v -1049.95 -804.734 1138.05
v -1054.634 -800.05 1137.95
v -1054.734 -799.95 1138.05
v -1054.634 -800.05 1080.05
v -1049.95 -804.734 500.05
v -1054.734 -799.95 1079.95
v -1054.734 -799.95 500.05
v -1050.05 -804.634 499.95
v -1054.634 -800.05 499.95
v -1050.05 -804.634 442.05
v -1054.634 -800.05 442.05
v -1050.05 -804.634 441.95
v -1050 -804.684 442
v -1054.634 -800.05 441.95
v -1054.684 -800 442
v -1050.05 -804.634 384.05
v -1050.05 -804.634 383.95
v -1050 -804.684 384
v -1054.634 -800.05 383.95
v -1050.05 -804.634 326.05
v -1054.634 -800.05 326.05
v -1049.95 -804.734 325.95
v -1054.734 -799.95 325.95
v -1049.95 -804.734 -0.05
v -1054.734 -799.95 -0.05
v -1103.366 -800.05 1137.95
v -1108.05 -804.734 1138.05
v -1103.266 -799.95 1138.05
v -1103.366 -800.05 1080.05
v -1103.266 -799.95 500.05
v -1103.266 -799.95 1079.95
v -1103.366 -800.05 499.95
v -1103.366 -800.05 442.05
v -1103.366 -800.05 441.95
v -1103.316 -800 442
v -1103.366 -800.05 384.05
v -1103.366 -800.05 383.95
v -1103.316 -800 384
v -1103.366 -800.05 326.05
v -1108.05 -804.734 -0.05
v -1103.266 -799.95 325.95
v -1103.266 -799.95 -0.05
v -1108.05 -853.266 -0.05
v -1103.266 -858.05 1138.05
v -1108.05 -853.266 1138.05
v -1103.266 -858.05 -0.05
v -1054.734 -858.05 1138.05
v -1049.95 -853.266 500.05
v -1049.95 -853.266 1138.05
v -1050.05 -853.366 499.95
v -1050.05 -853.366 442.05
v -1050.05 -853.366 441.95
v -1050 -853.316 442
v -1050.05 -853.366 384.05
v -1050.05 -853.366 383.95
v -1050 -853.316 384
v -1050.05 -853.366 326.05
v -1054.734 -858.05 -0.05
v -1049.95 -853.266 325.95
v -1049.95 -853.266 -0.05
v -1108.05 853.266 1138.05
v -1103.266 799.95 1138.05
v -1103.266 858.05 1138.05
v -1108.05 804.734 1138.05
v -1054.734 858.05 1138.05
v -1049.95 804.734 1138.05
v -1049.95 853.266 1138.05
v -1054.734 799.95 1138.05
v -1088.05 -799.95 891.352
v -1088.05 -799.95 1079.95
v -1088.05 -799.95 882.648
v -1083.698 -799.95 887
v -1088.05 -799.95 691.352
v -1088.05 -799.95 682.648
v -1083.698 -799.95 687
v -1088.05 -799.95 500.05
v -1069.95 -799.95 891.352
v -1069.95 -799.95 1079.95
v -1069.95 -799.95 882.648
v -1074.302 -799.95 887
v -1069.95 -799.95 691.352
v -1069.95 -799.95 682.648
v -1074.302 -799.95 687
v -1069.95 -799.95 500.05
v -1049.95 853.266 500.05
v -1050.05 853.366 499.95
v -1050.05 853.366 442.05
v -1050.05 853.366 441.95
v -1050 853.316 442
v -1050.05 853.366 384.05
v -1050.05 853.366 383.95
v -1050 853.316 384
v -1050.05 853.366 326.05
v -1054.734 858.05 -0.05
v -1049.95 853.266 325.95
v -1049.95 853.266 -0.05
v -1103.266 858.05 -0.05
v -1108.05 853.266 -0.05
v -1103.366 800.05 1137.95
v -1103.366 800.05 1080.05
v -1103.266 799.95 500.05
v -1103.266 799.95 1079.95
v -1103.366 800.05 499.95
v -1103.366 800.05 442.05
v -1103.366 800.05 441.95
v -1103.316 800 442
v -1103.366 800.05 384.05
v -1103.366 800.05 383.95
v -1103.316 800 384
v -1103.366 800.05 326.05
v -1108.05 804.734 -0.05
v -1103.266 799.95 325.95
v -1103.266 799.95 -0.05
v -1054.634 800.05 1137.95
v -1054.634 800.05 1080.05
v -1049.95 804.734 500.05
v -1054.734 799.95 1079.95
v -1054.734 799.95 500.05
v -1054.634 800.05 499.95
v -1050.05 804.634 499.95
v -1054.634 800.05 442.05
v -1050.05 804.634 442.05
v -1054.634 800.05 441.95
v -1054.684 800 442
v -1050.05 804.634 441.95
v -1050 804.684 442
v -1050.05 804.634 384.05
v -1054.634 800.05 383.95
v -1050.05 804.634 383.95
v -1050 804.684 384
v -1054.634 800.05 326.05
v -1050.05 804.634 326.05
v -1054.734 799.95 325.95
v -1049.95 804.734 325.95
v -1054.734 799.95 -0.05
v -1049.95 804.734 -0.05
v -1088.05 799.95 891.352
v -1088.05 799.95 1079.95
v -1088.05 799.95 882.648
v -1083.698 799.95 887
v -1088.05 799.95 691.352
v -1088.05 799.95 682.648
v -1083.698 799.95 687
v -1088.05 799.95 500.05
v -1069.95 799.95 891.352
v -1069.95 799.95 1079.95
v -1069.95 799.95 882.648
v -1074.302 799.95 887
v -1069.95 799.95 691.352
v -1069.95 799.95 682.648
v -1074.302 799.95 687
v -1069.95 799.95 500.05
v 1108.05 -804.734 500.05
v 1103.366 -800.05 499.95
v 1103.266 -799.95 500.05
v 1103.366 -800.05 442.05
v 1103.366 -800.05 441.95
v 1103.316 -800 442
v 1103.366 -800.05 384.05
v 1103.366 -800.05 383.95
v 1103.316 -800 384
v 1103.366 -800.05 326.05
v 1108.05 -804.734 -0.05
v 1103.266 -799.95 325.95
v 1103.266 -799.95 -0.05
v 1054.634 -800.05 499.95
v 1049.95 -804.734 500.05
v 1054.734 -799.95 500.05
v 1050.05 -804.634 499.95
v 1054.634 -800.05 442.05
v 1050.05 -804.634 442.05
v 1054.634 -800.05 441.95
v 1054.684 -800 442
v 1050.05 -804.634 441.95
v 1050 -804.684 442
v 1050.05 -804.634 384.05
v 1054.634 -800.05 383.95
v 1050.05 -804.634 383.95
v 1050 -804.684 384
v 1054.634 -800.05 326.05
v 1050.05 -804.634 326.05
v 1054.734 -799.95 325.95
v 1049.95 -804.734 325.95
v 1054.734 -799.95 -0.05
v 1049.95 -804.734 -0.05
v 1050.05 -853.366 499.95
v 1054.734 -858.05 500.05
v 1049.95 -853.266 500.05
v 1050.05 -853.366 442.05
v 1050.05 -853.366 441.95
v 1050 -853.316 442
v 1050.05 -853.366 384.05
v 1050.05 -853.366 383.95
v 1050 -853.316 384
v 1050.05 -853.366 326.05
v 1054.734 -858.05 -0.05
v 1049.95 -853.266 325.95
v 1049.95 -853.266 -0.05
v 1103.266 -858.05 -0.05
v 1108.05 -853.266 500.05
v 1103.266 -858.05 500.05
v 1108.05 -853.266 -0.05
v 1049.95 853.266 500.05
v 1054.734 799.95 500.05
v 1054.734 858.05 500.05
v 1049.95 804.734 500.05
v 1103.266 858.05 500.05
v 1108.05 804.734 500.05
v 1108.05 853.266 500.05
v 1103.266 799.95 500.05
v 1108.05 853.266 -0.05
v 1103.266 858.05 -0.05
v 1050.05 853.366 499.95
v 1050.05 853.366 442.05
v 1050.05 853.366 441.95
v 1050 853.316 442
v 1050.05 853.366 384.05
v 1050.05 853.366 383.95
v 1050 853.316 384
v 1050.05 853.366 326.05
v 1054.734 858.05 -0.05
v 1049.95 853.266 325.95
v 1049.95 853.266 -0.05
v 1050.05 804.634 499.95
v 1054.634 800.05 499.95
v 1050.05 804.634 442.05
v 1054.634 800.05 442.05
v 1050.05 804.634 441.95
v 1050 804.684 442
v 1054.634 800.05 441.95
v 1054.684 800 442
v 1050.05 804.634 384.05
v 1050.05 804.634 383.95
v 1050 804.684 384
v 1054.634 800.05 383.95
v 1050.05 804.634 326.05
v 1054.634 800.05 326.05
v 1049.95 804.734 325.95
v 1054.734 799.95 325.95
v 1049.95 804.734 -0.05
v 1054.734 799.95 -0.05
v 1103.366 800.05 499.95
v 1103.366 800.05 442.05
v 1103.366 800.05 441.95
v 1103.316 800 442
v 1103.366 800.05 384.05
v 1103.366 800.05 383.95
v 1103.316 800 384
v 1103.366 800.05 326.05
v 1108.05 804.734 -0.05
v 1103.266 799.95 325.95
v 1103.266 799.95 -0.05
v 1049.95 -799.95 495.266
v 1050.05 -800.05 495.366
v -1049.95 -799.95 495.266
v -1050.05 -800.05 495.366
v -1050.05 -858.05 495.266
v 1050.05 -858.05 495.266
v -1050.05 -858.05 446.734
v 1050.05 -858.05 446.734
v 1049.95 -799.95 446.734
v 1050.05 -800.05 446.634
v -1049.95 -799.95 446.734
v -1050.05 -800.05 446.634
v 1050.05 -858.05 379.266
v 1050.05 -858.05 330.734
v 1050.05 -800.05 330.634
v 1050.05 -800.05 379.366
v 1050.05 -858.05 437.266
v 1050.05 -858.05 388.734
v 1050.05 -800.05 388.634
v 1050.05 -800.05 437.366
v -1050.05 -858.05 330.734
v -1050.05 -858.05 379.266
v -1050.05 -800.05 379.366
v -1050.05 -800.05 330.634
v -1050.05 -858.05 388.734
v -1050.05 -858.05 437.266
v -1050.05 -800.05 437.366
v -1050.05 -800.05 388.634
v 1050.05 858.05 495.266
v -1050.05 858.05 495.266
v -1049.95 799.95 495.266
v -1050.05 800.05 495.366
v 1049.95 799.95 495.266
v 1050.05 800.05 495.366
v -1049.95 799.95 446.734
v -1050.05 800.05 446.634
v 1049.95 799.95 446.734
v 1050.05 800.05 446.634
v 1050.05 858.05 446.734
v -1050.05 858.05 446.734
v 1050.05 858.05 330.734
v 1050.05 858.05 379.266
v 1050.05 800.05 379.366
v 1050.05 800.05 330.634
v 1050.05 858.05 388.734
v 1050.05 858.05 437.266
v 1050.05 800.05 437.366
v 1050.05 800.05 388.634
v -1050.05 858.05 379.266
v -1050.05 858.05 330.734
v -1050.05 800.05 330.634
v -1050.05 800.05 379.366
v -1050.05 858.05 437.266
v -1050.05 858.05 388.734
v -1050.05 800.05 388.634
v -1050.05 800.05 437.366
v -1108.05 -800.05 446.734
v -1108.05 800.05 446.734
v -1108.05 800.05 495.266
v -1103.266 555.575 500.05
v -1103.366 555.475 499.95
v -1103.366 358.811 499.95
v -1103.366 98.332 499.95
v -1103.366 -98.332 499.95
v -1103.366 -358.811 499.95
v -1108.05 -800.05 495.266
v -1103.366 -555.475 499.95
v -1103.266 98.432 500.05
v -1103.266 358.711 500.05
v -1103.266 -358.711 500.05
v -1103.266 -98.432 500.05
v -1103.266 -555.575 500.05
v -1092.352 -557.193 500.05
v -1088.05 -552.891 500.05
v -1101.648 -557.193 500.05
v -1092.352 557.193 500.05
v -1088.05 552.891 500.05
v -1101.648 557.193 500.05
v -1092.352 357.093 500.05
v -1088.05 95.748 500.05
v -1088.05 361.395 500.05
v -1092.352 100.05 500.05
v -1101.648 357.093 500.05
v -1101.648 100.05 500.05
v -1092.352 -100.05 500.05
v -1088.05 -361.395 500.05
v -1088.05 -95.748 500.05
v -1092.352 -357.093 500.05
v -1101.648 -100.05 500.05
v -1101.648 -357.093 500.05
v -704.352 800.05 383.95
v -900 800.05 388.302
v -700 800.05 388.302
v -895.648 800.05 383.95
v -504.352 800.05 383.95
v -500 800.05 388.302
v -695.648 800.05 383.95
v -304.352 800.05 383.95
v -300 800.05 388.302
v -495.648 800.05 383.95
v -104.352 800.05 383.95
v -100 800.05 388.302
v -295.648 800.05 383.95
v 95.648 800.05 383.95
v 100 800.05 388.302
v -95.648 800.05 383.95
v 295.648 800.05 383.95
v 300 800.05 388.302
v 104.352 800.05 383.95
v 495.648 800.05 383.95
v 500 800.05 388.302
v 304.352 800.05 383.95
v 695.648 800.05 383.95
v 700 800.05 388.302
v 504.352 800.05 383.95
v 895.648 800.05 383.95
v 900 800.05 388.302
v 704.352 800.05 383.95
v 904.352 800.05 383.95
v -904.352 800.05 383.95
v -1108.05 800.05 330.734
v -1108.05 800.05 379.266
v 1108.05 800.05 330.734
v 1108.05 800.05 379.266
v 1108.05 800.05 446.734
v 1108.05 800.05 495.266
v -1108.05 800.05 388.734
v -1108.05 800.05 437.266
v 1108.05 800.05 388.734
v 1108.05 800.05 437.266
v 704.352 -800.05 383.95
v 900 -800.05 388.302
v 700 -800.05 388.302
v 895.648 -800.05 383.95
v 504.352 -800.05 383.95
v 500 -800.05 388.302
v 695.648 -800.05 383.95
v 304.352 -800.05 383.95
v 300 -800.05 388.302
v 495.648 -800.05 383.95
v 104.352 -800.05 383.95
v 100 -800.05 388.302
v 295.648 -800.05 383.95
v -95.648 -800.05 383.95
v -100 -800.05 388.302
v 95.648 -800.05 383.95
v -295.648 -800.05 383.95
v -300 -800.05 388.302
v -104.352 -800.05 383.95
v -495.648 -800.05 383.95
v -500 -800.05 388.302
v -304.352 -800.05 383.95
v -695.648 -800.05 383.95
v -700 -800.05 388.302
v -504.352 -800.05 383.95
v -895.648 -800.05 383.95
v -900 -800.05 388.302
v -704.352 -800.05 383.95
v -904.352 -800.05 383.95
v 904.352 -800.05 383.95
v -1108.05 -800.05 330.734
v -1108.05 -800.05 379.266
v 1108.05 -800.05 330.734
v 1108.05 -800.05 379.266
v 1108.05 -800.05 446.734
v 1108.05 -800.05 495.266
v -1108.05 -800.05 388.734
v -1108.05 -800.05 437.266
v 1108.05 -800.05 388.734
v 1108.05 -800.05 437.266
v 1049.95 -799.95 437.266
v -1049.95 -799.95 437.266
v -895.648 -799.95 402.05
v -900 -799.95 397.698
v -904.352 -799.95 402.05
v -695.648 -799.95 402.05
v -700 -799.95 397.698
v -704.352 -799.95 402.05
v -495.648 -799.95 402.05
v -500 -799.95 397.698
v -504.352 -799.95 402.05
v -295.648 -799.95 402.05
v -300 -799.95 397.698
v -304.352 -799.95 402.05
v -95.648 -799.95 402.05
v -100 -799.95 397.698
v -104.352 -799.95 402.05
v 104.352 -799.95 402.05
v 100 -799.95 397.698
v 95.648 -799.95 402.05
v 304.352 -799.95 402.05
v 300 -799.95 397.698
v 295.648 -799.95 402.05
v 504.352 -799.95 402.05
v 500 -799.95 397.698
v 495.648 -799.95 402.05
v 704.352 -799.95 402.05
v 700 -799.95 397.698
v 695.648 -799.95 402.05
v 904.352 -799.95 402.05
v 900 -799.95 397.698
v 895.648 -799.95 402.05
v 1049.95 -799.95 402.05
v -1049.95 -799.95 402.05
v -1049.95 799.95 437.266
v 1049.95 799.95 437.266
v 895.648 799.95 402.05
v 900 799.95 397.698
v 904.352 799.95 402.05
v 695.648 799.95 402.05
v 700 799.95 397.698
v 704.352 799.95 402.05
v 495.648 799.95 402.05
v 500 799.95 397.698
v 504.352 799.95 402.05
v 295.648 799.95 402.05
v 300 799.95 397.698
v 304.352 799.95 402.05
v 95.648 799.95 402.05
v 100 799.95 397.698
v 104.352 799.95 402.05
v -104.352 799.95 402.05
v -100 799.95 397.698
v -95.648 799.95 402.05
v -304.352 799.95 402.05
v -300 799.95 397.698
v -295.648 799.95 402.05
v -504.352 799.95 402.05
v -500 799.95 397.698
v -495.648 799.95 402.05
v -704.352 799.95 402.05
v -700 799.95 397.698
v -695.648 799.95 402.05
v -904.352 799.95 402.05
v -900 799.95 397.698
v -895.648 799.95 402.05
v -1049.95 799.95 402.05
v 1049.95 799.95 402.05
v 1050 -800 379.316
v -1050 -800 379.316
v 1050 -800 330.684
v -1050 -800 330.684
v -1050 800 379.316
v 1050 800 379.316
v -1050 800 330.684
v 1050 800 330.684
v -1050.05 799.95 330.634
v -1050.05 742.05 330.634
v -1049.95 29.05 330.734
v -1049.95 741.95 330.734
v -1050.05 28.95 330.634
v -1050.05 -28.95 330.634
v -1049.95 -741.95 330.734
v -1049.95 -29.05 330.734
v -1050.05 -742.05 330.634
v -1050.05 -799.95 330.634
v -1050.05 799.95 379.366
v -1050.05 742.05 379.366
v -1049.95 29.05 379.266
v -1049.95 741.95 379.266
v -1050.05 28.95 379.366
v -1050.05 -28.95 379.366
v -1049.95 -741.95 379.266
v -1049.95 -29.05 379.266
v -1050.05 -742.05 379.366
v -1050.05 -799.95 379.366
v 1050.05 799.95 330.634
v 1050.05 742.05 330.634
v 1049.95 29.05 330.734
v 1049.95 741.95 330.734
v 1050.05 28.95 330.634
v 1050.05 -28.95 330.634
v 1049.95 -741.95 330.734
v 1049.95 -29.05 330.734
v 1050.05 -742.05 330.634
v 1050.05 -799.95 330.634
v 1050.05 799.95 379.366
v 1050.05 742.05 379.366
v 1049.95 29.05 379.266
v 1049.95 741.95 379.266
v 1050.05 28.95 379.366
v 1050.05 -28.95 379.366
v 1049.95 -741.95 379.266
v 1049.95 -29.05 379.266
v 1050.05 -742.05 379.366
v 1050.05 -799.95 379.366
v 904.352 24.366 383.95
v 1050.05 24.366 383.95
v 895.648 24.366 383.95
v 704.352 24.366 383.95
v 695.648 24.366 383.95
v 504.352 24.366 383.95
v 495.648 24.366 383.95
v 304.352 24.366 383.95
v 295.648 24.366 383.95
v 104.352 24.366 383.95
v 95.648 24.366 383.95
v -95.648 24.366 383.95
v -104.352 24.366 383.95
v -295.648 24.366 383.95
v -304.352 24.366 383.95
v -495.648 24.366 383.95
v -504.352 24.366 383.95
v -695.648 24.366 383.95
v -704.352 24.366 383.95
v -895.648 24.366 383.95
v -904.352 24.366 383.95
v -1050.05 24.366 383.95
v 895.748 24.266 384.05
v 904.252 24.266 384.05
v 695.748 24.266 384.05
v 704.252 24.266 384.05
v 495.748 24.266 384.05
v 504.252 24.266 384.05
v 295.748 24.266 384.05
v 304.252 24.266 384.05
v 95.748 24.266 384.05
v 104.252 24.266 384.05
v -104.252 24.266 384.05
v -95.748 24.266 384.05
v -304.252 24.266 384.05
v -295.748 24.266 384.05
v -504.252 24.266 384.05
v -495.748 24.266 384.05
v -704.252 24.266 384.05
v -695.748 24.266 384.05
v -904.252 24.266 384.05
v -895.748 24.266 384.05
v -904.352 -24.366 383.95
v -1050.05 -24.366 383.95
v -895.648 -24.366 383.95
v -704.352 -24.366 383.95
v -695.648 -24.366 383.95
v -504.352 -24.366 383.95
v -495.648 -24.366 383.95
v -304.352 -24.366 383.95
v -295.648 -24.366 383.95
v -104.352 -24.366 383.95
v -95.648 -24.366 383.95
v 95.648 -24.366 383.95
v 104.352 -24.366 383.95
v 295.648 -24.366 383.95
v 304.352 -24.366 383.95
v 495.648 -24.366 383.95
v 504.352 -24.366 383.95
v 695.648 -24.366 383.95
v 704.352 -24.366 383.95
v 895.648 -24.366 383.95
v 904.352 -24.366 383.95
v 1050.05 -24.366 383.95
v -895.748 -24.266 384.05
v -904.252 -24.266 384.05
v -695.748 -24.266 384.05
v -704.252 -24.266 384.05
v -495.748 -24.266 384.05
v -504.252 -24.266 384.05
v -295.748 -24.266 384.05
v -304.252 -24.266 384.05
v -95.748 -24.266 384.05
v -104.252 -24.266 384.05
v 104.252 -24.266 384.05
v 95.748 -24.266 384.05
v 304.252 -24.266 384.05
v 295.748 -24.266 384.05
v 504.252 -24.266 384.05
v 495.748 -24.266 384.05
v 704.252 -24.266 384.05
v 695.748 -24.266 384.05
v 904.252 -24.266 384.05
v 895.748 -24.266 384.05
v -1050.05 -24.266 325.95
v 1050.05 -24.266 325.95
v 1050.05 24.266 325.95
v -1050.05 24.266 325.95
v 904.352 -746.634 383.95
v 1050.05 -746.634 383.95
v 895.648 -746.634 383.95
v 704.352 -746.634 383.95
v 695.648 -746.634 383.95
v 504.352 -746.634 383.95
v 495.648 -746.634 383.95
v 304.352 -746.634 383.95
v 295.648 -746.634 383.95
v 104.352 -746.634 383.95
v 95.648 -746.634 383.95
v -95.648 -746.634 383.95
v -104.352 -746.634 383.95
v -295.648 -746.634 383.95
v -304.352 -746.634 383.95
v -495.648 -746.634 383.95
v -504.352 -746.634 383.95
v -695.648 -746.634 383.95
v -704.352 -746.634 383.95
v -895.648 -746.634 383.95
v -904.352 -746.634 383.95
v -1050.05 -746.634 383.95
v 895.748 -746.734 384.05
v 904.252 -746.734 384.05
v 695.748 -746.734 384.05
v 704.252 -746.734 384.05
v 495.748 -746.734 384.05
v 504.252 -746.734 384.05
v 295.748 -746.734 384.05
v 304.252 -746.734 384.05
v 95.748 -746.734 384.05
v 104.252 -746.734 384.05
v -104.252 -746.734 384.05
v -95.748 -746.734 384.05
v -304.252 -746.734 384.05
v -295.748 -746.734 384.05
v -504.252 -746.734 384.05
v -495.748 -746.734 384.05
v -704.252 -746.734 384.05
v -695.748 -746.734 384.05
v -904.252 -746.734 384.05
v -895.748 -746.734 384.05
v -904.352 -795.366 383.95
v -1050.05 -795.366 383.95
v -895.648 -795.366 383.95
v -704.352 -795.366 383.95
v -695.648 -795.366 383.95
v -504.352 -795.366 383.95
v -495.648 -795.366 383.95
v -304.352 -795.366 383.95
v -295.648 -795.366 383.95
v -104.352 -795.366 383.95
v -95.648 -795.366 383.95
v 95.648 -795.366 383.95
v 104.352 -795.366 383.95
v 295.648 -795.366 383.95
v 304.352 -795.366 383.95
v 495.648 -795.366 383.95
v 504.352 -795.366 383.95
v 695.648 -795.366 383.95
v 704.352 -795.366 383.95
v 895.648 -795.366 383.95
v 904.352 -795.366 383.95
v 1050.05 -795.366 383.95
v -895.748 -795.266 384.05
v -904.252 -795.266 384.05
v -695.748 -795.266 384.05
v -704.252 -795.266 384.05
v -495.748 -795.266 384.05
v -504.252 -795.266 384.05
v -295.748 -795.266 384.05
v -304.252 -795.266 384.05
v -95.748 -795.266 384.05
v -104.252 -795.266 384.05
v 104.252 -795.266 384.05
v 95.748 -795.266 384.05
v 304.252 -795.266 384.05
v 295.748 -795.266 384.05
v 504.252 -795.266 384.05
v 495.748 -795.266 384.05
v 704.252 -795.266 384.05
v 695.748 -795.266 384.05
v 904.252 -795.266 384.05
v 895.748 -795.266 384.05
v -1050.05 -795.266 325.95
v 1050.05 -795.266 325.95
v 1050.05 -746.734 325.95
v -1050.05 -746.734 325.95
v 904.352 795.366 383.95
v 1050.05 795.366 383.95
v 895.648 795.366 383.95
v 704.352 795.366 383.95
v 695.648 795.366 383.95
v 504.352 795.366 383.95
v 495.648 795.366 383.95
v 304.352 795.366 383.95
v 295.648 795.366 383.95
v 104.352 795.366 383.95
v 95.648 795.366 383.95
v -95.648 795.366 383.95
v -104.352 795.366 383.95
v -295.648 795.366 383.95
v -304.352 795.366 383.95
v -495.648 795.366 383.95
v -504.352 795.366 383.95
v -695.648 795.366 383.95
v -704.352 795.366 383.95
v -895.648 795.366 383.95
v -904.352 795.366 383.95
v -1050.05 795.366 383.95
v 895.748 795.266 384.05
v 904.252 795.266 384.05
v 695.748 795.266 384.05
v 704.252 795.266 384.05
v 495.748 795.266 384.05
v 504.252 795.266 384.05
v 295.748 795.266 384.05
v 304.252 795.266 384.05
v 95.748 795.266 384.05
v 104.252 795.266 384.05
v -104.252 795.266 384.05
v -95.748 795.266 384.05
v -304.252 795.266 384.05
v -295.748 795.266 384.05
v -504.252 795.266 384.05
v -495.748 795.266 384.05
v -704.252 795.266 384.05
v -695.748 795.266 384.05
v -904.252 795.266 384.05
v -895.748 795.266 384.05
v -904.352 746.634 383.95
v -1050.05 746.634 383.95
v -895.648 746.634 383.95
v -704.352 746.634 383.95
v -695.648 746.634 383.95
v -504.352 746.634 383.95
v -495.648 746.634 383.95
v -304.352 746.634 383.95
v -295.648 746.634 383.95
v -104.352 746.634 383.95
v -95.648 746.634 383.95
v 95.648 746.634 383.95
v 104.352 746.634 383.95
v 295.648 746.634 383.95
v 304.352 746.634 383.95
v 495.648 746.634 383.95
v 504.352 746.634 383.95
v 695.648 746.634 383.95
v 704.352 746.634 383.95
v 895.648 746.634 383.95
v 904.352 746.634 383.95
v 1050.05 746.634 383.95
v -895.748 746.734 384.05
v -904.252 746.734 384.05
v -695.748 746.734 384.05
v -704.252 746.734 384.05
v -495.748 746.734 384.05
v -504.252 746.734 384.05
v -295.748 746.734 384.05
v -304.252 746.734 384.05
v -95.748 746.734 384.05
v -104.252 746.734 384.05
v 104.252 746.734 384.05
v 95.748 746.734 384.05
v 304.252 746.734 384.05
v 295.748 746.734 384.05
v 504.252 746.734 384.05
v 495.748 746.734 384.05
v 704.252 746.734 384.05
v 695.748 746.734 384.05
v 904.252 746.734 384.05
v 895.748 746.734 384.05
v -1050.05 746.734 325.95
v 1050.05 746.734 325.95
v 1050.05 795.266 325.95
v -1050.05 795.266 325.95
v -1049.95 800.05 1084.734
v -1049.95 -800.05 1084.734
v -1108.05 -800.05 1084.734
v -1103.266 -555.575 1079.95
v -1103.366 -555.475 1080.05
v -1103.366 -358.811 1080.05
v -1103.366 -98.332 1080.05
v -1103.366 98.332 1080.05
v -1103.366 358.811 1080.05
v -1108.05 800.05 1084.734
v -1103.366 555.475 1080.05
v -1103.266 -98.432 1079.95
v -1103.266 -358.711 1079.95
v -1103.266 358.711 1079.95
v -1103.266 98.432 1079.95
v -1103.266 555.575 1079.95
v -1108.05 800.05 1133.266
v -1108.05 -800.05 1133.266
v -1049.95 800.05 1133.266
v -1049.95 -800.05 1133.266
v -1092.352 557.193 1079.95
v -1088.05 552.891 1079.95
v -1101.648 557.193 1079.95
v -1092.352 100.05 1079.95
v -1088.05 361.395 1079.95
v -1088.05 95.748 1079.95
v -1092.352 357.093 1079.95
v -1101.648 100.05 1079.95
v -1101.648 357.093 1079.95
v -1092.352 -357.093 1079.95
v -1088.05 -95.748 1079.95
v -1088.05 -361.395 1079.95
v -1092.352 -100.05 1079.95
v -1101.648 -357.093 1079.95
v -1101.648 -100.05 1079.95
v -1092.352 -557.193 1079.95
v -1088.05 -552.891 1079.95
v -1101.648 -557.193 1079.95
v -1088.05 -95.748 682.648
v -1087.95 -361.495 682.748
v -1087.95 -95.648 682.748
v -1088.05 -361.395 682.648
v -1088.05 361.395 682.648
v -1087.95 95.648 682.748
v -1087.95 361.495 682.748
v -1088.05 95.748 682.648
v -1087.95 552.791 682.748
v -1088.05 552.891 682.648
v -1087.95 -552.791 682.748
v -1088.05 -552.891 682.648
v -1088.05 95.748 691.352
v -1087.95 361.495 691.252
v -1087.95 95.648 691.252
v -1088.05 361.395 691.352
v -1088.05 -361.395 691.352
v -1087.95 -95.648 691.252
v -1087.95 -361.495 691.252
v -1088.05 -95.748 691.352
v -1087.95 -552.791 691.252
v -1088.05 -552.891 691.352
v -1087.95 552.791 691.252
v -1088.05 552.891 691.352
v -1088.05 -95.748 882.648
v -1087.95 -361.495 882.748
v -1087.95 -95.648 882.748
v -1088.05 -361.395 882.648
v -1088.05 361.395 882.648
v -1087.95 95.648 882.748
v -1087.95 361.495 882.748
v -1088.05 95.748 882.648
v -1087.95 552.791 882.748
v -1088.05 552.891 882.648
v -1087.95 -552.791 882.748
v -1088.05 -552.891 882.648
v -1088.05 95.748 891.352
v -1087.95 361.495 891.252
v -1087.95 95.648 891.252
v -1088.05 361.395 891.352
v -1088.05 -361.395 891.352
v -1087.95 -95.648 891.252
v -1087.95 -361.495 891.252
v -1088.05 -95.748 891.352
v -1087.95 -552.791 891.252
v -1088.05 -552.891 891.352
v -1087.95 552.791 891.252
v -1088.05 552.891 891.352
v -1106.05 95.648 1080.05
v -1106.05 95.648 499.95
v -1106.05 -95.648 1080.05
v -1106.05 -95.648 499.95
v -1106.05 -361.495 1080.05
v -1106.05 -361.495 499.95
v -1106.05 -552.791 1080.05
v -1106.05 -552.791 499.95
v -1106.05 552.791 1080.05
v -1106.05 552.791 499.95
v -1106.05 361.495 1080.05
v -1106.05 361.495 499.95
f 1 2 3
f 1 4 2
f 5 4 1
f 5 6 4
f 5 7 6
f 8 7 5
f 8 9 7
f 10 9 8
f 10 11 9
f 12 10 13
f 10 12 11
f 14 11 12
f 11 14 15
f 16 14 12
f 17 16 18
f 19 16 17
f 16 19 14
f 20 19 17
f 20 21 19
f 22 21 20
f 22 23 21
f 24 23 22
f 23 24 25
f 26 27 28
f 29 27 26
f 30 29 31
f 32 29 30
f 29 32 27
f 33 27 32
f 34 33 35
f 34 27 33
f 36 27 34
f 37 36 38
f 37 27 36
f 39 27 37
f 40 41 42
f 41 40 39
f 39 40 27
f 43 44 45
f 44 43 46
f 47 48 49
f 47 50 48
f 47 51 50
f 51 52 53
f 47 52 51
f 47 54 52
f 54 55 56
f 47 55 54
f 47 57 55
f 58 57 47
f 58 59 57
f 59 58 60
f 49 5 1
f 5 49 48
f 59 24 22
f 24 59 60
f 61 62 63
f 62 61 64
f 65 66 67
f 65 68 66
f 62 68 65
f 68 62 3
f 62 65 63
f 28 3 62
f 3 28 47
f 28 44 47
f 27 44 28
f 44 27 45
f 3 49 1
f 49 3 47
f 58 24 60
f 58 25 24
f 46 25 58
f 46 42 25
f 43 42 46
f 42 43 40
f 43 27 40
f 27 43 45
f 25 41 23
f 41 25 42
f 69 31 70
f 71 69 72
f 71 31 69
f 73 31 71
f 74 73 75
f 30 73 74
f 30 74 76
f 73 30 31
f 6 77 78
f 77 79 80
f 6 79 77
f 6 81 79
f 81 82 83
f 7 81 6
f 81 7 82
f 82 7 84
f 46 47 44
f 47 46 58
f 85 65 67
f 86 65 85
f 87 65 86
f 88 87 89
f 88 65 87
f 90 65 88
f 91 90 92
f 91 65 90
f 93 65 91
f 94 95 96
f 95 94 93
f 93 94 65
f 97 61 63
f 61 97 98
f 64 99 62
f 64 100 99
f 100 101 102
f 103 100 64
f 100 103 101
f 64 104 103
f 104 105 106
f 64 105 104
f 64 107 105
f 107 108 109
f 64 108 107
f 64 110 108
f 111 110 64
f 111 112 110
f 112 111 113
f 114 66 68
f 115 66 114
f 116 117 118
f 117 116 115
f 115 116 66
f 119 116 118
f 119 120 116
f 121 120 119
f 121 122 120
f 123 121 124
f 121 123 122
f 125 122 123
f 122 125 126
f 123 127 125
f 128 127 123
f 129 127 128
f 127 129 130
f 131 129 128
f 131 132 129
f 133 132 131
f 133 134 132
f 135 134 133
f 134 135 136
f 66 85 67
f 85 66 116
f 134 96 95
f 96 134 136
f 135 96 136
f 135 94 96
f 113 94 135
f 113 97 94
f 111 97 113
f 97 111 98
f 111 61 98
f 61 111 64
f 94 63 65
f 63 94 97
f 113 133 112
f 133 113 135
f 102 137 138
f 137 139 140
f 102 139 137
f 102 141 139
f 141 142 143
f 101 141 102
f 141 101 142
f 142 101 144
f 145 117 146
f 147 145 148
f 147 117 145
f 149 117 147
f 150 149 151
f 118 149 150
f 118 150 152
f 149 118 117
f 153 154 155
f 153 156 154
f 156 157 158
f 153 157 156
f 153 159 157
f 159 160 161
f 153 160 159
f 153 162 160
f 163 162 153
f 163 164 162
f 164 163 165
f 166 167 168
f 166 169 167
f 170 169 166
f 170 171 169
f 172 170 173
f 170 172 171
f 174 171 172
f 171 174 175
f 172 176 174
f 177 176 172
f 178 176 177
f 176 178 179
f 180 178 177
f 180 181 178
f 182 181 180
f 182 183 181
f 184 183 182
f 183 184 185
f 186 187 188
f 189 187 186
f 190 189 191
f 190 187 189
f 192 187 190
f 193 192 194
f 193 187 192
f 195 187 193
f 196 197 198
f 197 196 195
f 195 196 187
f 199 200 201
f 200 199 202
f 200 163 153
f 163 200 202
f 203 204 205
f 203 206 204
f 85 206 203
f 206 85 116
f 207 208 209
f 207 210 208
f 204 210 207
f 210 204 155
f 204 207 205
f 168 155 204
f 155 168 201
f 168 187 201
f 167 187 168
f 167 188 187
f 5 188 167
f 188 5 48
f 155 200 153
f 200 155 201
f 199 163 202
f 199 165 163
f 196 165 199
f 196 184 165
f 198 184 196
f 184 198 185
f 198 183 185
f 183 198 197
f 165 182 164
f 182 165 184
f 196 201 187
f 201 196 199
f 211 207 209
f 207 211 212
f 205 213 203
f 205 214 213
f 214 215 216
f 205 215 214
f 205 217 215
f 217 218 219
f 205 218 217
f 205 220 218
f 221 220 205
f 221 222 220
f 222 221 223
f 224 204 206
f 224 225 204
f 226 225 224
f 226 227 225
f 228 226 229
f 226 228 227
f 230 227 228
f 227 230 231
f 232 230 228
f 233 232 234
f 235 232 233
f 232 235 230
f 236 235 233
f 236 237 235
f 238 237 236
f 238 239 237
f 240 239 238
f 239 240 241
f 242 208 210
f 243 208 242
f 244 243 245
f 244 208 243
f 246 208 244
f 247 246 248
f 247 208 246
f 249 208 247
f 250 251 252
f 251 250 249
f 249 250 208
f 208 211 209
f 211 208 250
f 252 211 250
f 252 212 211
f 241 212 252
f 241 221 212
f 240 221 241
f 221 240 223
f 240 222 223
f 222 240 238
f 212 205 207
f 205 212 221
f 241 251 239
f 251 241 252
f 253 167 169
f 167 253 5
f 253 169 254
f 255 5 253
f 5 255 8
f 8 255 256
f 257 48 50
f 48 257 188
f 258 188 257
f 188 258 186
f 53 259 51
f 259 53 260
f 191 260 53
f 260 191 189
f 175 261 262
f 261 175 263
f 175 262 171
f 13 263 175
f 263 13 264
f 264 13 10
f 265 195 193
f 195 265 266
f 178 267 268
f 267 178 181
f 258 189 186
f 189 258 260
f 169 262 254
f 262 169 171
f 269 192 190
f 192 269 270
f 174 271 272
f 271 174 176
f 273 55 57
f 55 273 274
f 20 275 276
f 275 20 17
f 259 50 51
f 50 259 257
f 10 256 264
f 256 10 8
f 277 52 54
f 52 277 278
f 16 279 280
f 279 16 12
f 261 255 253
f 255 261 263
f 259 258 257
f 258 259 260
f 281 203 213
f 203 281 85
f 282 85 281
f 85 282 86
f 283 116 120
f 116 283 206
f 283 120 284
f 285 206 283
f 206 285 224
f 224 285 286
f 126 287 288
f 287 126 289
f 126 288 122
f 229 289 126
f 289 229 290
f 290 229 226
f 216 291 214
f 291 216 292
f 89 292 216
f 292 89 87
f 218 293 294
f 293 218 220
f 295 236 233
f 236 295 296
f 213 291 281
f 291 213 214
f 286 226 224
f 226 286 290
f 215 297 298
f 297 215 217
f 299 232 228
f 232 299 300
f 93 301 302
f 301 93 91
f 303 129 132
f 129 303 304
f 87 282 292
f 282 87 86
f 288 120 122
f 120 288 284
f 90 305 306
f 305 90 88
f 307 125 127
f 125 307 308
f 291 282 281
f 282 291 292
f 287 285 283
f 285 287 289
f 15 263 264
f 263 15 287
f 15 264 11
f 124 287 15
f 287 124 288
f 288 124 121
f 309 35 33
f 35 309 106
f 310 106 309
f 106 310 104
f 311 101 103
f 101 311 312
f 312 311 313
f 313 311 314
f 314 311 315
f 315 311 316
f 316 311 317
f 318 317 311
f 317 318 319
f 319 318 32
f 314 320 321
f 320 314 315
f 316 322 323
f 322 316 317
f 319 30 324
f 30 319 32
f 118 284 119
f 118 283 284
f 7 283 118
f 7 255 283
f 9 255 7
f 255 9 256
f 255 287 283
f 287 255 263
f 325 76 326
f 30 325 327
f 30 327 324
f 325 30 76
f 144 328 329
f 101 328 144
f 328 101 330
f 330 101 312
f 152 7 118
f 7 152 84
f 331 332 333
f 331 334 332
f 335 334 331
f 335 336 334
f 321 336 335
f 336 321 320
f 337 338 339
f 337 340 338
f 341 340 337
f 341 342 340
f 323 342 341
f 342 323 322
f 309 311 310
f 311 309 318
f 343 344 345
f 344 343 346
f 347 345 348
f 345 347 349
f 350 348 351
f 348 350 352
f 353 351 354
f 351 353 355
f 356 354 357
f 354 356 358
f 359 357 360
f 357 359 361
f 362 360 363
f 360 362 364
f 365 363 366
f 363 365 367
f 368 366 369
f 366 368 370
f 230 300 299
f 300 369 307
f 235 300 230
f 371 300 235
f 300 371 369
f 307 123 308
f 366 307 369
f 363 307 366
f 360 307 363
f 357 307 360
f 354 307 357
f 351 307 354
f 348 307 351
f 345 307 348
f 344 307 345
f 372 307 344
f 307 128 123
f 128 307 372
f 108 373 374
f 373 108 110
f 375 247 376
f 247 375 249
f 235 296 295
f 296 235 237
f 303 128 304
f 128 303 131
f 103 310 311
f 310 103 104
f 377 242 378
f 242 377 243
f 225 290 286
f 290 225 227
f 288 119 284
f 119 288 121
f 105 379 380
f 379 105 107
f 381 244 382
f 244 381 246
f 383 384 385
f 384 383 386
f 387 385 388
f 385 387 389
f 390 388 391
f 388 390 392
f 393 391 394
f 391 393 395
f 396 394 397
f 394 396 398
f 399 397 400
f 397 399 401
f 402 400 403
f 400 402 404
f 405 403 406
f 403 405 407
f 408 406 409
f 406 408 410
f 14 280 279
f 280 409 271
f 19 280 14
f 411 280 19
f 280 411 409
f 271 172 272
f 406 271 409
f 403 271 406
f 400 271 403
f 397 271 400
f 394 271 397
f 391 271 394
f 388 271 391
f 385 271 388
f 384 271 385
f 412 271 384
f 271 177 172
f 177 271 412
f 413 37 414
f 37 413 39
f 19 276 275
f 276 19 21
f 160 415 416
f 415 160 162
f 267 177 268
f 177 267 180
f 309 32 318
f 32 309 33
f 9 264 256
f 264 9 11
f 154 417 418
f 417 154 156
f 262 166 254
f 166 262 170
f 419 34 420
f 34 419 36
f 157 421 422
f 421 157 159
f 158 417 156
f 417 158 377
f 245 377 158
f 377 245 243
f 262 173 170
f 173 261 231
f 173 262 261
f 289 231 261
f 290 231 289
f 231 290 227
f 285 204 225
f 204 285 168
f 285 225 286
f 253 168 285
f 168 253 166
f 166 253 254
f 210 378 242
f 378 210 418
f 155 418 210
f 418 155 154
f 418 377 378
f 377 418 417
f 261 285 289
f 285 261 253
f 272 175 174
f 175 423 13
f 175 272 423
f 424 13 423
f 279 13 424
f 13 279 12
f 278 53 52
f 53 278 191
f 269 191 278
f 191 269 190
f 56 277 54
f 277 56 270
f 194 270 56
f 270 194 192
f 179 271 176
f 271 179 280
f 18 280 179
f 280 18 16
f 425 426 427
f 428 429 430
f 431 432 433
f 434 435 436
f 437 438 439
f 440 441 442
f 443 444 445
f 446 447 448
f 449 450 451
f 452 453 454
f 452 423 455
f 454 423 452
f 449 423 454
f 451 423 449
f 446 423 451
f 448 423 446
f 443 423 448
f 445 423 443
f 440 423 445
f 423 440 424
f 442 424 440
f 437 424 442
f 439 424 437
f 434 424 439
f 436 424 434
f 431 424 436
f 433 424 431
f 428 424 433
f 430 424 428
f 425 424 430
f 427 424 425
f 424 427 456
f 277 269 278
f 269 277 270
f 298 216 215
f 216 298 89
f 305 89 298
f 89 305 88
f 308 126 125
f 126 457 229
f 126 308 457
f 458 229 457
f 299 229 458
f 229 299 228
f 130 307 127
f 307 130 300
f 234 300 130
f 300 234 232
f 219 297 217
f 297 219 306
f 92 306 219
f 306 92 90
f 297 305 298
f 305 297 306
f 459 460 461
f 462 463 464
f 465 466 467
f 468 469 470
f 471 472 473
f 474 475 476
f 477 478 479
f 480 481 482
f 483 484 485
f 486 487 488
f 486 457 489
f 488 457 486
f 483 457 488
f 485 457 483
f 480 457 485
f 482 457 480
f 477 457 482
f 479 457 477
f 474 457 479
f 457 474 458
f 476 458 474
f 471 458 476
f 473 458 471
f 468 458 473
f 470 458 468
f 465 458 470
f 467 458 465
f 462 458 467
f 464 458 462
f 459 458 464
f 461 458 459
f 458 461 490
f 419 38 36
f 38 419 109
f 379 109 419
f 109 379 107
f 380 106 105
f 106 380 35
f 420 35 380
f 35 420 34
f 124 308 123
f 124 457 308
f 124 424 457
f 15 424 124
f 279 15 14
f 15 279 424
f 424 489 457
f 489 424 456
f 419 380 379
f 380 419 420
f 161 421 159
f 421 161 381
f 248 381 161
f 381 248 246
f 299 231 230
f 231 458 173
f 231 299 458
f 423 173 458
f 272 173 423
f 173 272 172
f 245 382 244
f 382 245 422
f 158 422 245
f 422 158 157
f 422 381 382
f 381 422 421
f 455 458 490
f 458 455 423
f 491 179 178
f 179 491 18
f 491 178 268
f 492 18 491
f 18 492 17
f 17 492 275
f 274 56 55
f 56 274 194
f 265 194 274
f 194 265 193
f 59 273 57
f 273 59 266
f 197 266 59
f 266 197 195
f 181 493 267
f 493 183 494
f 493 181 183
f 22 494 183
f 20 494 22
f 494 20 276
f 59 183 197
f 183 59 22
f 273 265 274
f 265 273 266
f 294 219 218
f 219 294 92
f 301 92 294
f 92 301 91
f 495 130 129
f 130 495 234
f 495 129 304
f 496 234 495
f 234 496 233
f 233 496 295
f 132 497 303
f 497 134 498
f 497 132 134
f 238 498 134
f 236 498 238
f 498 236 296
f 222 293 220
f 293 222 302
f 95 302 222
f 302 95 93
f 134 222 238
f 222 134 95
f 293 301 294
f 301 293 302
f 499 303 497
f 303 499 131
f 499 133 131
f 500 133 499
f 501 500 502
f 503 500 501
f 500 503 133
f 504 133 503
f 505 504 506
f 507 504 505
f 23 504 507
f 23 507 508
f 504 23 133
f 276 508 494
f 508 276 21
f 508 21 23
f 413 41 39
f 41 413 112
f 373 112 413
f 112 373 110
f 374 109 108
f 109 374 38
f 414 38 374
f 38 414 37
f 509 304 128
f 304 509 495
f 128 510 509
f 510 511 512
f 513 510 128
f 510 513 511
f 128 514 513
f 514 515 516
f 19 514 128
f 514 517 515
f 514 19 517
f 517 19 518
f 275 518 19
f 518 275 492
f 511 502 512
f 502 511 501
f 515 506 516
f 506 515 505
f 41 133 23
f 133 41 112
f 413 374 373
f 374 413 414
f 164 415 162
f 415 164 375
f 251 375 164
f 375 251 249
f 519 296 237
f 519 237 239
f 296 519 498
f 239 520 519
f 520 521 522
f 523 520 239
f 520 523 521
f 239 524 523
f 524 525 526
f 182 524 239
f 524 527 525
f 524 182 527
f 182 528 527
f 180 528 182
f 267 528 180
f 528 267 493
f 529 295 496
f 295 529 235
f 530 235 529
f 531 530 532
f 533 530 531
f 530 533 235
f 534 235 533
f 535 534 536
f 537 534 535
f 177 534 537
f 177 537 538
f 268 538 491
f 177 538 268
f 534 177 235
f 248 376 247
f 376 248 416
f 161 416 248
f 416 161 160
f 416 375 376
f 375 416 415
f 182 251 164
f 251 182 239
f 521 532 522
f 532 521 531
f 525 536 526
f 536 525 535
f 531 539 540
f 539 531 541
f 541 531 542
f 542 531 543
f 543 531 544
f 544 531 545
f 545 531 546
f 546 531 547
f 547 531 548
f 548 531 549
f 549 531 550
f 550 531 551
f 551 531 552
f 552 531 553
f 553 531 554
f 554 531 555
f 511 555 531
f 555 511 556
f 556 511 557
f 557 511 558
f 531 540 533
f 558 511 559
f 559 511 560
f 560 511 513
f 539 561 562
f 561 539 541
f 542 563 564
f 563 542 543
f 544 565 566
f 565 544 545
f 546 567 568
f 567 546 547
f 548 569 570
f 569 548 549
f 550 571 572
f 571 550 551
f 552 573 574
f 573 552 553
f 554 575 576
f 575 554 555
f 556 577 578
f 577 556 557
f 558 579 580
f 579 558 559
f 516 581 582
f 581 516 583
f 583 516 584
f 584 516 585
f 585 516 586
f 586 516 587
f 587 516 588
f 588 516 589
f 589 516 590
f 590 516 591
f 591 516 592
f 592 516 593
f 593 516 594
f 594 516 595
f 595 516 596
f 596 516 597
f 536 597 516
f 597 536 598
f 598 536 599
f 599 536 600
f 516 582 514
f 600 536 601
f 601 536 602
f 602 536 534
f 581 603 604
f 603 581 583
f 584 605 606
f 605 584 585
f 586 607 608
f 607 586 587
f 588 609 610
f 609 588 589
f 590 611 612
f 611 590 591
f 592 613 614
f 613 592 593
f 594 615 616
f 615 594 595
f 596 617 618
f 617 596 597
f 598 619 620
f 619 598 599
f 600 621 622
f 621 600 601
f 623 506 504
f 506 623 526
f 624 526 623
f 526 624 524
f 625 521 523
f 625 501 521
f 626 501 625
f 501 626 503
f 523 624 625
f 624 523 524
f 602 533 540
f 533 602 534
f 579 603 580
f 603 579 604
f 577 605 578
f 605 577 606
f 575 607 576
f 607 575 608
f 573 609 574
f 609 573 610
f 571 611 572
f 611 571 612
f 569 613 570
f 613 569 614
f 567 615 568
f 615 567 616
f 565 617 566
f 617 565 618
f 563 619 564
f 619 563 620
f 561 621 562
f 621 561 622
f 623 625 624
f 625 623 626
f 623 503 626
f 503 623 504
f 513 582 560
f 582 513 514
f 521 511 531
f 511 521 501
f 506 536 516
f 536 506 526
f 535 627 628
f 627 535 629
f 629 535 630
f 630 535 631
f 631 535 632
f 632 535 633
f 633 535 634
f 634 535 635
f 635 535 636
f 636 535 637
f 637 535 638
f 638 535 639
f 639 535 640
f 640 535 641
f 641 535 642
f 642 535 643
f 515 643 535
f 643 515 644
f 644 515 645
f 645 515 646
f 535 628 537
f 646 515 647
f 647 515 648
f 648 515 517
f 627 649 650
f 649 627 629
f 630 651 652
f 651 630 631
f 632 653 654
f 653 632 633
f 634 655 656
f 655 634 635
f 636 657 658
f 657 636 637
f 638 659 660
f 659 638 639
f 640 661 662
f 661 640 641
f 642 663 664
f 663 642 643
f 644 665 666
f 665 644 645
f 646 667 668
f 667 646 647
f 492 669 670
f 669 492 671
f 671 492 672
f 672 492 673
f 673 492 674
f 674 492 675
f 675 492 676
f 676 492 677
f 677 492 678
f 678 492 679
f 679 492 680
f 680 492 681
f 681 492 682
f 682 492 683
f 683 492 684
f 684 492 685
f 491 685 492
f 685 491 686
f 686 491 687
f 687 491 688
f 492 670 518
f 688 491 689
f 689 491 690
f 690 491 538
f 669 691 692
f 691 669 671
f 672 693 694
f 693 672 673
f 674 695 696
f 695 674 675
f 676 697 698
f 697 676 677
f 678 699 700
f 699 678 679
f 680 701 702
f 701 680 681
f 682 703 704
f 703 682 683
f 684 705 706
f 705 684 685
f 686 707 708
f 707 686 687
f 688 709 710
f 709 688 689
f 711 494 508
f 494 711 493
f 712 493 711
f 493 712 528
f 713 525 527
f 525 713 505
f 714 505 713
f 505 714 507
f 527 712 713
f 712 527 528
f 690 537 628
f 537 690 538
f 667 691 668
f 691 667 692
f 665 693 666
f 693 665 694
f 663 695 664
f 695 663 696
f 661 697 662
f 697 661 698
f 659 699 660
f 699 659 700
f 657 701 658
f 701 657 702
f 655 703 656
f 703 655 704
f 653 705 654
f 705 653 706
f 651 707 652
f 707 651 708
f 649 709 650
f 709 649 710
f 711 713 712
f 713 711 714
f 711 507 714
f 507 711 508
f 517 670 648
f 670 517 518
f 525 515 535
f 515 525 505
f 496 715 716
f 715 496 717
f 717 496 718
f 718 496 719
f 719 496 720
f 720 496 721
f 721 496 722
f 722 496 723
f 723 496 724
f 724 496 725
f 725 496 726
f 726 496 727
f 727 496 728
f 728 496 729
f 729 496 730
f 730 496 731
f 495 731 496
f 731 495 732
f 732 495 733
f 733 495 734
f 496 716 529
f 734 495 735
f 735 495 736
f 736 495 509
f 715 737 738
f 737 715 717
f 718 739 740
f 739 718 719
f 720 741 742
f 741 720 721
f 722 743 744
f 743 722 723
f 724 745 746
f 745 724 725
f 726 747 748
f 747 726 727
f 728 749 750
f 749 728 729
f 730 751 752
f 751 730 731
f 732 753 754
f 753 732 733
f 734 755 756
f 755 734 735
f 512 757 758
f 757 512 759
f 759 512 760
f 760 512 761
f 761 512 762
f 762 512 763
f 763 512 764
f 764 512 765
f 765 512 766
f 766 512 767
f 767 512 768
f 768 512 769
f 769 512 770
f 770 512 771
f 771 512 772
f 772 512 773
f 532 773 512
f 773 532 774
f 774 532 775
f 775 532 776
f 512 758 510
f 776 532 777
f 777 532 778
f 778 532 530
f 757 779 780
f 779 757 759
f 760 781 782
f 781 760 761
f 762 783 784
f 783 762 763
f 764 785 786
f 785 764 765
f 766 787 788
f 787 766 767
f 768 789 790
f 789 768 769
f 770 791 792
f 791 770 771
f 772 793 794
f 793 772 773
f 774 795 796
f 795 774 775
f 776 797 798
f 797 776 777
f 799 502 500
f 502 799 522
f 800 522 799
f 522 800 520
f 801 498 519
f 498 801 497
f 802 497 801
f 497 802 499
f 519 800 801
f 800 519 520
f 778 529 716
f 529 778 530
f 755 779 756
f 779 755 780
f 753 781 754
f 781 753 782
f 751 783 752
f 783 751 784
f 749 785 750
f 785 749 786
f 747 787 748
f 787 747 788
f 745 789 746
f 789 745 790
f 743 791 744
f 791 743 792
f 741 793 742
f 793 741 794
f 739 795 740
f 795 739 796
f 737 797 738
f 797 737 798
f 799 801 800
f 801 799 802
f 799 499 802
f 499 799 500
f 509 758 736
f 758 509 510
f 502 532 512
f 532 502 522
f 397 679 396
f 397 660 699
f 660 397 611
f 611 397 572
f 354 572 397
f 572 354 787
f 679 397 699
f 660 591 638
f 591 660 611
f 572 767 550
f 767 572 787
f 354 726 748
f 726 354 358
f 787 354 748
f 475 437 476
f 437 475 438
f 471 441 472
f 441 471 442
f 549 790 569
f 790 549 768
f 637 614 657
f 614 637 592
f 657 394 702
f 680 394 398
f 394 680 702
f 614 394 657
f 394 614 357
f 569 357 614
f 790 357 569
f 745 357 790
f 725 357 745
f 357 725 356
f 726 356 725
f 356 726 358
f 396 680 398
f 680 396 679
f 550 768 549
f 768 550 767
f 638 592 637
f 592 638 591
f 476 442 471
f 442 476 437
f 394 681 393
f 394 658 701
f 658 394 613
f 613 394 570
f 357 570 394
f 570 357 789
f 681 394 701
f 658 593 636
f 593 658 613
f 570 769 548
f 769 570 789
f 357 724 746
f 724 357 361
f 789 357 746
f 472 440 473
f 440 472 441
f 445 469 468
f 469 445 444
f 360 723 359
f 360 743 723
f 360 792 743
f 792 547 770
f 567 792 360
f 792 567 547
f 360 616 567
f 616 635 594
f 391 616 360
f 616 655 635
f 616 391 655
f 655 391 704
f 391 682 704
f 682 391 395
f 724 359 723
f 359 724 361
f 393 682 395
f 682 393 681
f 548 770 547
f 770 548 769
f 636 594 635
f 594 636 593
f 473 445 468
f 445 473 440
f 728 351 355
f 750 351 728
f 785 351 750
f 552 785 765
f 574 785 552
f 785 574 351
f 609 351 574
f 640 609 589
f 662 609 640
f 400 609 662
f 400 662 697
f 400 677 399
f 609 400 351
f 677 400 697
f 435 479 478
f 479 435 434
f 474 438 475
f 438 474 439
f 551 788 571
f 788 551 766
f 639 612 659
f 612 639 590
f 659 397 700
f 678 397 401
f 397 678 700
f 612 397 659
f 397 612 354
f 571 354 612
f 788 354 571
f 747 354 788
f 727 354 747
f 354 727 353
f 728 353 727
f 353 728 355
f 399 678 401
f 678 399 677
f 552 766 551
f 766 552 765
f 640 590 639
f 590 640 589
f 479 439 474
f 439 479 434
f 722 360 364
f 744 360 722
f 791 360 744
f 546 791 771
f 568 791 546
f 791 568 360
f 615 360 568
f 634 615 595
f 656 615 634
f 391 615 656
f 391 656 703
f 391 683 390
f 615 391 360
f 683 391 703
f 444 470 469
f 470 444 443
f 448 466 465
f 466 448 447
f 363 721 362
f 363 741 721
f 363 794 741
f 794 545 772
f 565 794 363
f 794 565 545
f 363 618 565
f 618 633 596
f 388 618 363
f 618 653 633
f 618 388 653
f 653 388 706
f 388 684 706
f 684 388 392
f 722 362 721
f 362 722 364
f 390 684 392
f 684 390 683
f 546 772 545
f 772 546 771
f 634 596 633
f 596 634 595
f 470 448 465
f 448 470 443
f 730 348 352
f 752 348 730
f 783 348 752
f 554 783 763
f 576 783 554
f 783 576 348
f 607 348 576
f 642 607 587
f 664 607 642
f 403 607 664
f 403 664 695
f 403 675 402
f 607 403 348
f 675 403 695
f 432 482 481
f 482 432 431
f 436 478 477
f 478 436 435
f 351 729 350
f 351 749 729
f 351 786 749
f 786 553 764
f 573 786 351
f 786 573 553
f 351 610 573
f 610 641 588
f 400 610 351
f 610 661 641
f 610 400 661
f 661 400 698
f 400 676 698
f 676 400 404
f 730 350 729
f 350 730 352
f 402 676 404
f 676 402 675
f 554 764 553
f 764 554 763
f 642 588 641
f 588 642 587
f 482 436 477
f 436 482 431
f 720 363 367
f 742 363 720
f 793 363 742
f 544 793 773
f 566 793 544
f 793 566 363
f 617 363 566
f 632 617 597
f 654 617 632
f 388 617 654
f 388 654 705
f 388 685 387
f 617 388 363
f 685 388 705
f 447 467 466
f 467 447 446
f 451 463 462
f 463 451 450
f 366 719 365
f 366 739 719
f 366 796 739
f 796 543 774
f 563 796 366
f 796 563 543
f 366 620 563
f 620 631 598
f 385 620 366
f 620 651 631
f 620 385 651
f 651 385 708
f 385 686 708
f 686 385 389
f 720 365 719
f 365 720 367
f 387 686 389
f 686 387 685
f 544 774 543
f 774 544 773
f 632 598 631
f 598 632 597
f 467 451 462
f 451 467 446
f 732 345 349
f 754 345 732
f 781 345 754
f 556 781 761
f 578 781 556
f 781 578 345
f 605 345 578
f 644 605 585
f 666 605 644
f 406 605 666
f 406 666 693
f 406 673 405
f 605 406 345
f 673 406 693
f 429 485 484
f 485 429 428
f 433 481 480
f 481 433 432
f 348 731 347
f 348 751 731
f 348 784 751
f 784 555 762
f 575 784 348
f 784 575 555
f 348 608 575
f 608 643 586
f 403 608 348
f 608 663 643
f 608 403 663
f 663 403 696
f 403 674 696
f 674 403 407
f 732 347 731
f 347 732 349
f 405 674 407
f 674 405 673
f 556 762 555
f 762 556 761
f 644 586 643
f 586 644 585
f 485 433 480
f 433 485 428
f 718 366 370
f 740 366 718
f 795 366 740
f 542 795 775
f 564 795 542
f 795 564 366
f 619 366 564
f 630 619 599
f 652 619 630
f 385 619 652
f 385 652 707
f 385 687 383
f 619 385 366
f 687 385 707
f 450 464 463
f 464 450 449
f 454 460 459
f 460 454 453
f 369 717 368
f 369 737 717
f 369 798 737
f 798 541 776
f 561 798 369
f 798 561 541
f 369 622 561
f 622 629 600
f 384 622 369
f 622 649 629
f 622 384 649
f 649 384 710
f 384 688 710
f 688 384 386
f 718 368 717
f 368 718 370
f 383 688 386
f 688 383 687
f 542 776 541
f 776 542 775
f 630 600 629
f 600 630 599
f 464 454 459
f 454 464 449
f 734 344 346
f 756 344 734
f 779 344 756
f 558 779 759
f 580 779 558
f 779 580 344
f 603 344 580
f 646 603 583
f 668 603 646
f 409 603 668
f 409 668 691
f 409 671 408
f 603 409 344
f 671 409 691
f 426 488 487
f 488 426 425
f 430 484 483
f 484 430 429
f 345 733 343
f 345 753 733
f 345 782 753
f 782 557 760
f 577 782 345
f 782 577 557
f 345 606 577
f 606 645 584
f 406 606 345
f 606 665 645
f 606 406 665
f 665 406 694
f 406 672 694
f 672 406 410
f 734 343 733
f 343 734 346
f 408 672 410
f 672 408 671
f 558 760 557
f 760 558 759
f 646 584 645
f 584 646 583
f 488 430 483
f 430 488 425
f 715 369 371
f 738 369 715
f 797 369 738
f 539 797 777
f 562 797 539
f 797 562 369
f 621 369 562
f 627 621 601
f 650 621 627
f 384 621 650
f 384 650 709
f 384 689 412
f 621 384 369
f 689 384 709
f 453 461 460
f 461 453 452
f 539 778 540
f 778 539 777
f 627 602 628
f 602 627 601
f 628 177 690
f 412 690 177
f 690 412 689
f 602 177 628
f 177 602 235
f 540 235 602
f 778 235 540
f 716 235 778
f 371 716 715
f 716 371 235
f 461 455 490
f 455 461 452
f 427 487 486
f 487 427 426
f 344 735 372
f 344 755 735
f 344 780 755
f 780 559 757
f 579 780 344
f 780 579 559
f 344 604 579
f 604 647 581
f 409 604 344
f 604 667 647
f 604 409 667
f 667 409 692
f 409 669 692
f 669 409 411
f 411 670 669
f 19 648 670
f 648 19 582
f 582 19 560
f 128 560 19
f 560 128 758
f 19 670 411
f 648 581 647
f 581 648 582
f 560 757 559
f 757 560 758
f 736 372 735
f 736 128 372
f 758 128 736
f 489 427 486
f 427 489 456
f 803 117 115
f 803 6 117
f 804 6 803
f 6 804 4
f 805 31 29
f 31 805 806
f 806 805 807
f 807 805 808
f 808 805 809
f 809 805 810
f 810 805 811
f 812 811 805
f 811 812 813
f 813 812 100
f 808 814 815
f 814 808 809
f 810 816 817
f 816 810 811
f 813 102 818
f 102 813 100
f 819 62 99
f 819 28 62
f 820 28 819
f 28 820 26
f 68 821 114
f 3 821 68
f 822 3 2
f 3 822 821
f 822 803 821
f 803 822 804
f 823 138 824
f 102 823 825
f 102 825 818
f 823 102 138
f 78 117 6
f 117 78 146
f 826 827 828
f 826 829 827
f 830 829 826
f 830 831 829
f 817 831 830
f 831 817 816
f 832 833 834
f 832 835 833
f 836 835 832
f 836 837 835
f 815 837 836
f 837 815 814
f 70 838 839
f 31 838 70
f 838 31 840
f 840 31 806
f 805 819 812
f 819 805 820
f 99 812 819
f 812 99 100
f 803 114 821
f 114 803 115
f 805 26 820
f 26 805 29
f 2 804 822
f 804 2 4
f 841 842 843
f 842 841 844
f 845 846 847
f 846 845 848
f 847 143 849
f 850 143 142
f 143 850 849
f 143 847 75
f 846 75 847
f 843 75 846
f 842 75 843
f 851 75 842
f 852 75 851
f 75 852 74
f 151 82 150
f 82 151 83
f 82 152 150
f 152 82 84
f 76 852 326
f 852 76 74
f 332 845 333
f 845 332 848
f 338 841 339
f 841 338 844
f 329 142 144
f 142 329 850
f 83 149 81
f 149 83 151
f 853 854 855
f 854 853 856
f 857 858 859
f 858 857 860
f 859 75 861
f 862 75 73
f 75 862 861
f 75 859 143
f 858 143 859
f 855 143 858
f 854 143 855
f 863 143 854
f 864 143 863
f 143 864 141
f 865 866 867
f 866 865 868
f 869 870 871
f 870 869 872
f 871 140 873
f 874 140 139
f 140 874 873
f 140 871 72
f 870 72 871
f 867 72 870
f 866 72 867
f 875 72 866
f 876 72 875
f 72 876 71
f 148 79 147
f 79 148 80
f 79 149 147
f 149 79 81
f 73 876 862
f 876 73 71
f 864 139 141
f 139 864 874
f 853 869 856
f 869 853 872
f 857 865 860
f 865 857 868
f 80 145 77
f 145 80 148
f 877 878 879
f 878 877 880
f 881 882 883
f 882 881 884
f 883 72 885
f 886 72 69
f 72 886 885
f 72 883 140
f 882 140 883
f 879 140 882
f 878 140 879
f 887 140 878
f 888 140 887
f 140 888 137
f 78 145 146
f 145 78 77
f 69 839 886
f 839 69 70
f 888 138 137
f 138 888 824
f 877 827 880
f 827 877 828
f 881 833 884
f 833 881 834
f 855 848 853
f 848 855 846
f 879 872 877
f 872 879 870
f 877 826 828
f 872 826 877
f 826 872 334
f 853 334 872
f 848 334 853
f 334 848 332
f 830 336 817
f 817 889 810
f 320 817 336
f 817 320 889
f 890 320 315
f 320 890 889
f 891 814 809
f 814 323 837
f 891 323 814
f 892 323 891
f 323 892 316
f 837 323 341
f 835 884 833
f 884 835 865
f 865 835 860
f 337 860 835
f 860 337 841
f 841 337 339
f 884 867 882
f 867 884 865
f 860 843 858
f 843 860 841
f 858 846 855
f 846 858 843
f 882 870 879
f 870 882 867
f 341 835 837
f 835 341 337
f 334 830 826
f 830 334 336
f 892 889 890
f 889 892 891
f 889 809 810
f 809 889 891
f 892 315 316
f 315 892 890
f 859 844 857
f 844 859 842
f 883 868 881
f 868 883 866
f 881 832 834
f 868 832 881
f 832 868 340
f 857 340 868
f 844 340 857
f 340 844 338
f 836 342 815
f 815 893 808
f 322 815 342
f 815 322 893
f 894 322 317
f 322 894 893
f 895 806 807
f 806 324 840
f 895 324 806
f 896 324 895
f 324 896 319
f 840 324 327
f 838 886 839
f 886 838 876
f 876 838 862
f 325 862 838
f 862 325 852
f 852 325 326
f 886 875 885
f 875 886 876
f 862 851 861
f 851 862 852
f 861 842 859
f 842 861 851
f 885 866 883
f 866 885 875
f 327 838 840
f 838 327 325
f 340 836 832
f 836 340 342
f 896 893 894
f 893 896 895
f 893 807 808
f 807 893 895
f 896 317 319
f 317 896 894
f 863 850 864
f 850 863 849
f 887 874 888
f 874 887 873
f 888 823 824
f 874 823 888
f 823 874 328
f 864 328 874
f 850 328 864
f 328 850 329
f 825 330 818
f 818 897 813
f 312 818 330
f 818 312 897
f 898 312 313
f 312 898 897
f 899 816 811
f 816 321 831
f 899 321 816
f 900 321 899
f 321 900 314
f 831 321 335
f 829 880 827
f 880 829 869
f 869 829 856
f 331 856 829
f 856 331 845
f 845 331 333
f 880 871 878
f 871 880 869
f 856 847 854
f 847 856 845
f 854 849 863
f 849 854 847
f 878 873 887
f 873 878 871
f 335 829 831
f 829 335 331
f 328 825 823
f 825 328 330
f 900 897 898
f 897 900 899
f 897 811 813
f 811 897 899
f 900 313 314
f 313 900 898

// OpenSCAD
// hannah's bed

// dimensions
INNER_X = 1600;
INNER_Y = 2100;
OUTER_Z = 500;

echo("mattress size", INNER_X, INNER_Y);

// beam width
BEAM_X = 58;
FAZE = 1.15; // faze factor
BOARD_FAZE = FAZE / 2.77;
Z_FACTOR = 3; 
HEAD_FACTOR = 11; // height at head (no. of beams)
BOARD_X = 18;
BOARD_Y = 200;

q = .1; // overlap for stl output

echo("beam width", BEAM_X);
echo("board profile", BOARD_X, BOARD_Y);

module xbeam(dx, dy, dz) {
    translate([dx, dy, dz+BEAM_X/2]) {    
        difference() {
            cube(size=[INNER_Y+q, BEAM_X+q, BEAM_X+q], center=true);
            for (r=[0+45, 90+45, 180+45, 270+45])     
            rotate([r, 0, 0])
                translate([0, BEAM_X*FAZE, 0]) 
                    cube(size=[INNER_Y+1, BEAM_X, BEAM_X], center=true);
        }
    }
}
echo("X beam length", INNER_Y+(BEAM_X*2));
module ybeam(dx, dy, dz) {
    translate([dx, dy, dz+BEAM_X/2]) {
        difference() {
            cube(size=[BEAM_X+q, INNER_X+q, BEAM_X+q], center=true);        
            for (r=[0+45, 90+45, 180+45, 270+45])     
            rotate([0, r, 0])
                translate([BEAM_X*FAZE, 0, 0]) 
                    cube(size=[BEAM_X, INNER_X+1, BEAM_X], center=true);
        }
    }
}
echo("Y beam length", INNER_X+(BEAM_X*4));
module zbeam(dx, dy, dz, ds=0) {
    translate([dx, dy, OUTER_Z/2+ds/2+dz]) {
        difference() {
            cube(size=[BEAM_X+q, BEAM_X+q, OUTER_Z+ds+q], center=true);   
            for (r=[0+45, 90+45, 180+45, 270+45])     
            rotate([0, 0, r])
                translate([BEAM_X*FAZE, 0, 0]) 
                    cube(size=[BEAM_X, BEAM_X, OUTER_Z+ds+1], center=true);
        }
    }
}
echo("Z beam length", OUTER_Z);
echo("Z beam at head", OUTER_Z+(HEAD_FACTOR*BEAM_X));

module etage(dz) {
    translate([0,0,dz]) {
        xbeam(0, -(INNER_X+BEAM_X)/2, 0);
        xbeam(0, (INNER_X+BEAM_X)/2, 0);
        ybeam(-(INNER_Y+BEAM_X)/2, 0, 0);
        ybeam((INNER_Y+BEAM_X)/2, 0, 0);
    }
}

module yboard(dx, dy, dz) {
    translate([dx, dy, dz]) {
        difference() {
            cube(size=[BOARD_X+q, INNER_X+q, BOARD_Y+q], center=true);
            for (r=[0+45, 90+45, 180+45, 270+45])     
            rotate([0, r, 0])
                translate([BOARD_Y*BOARD_FAZE, 0, 0]) 
                    cube(size=[BOARD_X, INNER_X+1, BOARD_Y], center=true);
        }
    }
}
module headboard(h=0) {
    difference() {
        cube(size=[BOARD_X+q, h+q, BOARD_Y+q], center=true);
        for (r=[0+45, 90+45, 180+45, 270+45])     
        rotate([0, r, 0])
            translate([BOARD_Y*BOARD_FAZE, 0, 0]) 
                cube(size=[BOARD_X, INNER_X+1, BOARD_Y], center=true);
    }
}

// vertical
zbeam(-(INNER_Y+BEAM_X)/2, -(INNER_X+BEAM_X)/2, 0, BEAM_X*HEAD_FACTOR);
zbeam(-(INNER_Y+BEAM_X)/2, (INNER_X+BEAM_X)/2, 0, BEAM_X*HEAD_FACTOR);
zbeam((INNER_Y+BEAM_X)/2, -(INNER_X+BEAM_X)/2, 0);
zbeam((INNER_Y+BEAM_X)/2, (INNER_X+BEAM_X)/2,0);

// etages
for (z=[1:Z_FACTOR])
    etage(OUTER_Z-(z*BEAM_X));
    
// bottom
translate([0, 0, OUTER_Z-(Z_FACTOR-1)*BEAM_X]) {
    translate([0, 0, -BEAM_X]) {
        xbeam(0, 0, 0);
        translate([0, -(INNER_X-BEAM_X)/2, 0]) xbeam(0,0,0);
        translate([0, (INNER_X-BEAM_X)/2, 0]) xbeam(0,0,0);
    }
    translate([0, 0, BOARD_X/2]) {
        rotate([0, 90, 0]) yboard(0,0,0);
        for (y=[1:round(INNER_Y/2/BOARD_Y)]) {
            translate([y*BOARD_Y, 0, 0]) 
                rotate([0, 90, 0]) yboard(0,0,0);
            translate([-y*BOARD_Y, 0, 0]) 
                rotate([0, 90, 0]) yboard(0,0,0);
        }
        
    }
} 





// check: mattress
translate([0, 0, OUTER_Z-(BEAM_X)]) 
    %cube(size=[INNER_Y, INNER_X, 200], center=true);

// head part
ybeam(-(INNER_Y+BEAM_X)/2, 0, OUTER_Z-BEAM_X+HEAD_FACTOR*BEAM_X);
for (z=[0:round(HEAD_FACTOR*BEAM_X/BOARD_Y)-1]) {
    translate([-(INNER_Y+BEAM_X)/2, 0, OUTER_Z+BEAM_X*1.5+z*BOARD_Y]) 
        yboard(0,0,0);
}
for (y=[0, -INNER_X/3.5, INNER_X/3.5])
    translate([-(INNER_Y+BEAM_X)/2-BOARD_X, y, OUTER_Z-BEAM_X/2+HEAD_FACTOR*BEAM_X/2]) 
    rotate([90, 0, 0]) 
    headboard((HEAD_FACTOR-1)*BEAM_X);
// yboard(-(INNER_Y+BOARD_X)/2, 0, OUTER_Z-BEAM_X+180);

//.
